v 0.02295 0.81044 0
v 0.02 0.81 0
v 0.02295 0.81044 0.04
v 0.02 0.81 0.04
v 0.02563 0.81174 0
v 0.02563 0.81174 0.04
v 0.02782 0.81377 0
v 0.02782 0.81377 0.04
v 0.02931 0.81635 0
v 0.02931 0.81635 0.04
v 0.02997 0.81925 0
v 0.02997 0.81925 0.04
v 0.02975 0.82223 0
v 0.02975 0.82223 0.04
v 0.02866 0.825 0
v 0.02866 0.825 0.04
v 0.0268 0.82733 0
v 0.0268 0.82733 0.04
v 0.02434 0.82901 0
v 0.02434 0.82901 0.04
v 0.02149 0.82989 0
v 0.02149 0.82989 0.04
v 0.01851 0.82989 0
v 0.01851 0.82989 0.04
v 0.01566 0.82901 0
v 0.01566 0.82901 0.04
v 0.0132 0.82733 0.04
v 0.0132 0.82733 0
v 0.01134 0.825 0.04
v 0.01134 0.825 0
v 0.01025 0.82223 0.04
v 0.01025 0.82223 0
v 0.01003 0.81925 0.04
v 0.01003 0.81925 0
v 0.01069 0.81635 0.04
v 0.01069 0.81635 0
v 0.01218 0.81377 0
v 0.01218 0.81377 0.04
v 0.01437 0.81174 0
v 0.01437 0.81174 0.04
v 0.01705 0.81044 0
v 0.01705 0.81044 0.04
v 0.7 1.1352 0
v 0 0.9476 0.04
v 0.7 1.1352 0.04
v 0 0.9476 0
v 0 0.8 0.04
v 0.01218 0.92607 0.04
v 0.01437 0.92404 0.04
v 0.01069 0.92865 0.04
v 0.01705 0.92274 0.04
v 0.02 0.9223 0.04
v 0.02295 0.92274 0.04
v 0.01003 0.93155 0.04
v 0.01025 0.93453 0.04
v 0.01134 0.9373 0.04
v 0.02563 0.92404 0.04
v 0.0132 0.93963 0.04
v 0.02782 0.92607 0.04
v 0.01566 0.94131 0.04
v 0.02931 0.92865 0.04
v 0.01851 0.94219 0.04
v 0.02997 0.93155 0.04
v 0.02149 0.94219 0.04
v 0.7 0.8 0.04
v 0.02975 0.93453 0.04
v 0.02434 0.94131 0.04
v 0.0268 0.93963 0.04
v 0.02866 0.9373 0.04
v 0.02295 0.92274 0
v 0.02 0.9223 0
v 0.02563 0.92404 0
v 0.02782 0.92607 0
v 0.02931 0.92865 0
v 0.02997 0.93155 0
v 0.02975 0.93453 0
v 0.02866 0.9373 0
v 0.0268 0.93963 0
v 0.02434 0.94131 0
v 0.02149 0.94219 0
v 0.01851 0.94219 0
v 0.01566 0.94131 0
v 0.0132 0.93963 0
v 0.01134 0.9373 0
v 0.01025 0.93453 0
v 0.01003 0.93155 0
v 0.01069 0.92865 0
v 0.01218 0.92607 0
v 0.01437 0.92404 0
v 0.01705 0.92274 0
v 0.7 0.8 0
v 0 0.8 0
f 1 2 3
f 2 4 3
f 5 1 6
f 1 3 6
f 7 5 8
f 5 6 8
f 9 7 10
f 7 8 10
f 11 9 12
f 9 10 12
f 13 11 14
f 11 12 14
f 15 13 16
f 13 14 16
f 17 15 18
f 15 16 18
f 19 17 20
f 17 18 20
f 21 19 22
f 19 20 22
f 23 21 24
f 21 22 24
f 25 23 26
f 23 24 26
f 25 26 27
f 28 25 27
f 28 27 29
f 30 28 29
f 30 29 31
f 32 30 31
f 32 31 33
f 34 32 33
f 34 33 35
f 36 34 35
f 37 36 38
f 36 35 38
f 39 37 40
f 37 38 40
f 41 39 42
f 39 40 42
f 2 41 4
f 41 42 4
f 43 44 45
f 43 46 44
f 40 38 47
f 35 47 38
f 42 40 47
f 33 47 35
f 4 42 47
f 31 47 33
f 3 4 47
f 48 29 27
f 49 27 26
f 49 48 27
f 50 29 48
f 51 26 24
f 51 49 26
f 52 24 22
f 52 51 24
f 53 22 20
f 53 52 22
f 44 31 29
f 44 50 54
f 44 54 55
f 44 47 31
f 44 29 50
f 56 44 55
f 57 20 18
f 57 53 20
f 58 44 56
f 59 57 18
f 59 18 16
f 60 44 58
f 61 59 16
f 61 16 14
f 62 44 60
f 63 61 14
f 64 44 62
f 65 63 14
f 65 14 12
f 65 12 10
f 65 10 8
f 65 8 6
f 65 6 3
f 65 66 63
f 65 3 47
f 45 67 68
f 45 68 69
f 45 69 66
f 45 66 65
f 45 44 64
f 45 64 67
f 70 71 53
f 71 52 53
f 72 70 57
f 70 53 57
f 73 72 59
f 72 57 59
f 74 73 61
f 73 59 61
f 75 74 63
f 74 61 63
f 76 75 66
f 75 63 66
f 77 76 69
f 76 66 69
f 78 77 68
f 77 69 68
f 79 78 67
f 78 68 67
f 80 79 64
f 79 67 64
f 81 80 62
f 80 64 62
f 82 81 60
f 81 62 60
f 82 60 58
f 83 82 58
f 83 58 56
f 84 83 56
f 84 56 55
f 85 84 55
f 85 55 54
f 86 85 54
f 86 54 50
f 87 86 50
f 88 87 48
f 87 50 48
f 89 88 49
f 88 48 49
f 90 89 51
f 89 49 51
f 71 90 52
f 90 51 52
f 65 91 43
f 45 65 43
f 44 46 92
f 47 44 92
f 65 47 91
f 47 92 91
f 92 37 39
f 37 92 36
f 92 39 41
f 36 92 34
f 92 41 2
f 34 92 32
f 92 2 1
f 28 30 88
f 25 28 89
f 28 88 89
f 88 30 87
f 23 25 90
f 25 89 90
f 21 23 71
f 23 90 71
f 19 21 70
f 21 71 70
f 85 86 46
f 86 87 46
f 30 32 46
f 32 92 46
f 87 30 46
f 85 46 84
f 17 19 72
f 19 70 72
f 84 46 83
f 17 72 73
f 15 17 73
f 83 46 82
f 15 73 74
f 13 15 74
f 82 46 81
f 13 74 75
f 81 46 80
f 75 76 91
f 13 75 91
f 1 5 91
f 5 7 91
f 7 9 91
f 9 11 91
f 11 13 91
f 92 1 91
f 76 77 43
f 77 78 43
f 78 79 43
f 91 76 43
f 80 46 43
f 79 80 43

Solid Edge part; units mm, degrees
sketch "Sketch1" plane through (0, 0, 0) normal (0, 0, 1) x (1, 0, 0)
  line L0 (0, 0.8) -> (0.7, 0.8)
  line L1 (0.7, 0.8) -> (0.7, 1.1352)
  line L2 (0, 0.9476) -> (0.7, 1.1352)
  line L3 (0, 0.9476) -> (0, 0.8)
extrude "Protrusion1" add sketch "Sketch1" along normal blind 0.04
hole "Bohrung_3" at (0.02, 0.82, 0.04) direction (0, 0, -1) diameter 0.02 end through all
hole "Hole1" at (0.02, 0.9323, 0.04) direction (0, 0, -1) diameter 0.02 end through all
